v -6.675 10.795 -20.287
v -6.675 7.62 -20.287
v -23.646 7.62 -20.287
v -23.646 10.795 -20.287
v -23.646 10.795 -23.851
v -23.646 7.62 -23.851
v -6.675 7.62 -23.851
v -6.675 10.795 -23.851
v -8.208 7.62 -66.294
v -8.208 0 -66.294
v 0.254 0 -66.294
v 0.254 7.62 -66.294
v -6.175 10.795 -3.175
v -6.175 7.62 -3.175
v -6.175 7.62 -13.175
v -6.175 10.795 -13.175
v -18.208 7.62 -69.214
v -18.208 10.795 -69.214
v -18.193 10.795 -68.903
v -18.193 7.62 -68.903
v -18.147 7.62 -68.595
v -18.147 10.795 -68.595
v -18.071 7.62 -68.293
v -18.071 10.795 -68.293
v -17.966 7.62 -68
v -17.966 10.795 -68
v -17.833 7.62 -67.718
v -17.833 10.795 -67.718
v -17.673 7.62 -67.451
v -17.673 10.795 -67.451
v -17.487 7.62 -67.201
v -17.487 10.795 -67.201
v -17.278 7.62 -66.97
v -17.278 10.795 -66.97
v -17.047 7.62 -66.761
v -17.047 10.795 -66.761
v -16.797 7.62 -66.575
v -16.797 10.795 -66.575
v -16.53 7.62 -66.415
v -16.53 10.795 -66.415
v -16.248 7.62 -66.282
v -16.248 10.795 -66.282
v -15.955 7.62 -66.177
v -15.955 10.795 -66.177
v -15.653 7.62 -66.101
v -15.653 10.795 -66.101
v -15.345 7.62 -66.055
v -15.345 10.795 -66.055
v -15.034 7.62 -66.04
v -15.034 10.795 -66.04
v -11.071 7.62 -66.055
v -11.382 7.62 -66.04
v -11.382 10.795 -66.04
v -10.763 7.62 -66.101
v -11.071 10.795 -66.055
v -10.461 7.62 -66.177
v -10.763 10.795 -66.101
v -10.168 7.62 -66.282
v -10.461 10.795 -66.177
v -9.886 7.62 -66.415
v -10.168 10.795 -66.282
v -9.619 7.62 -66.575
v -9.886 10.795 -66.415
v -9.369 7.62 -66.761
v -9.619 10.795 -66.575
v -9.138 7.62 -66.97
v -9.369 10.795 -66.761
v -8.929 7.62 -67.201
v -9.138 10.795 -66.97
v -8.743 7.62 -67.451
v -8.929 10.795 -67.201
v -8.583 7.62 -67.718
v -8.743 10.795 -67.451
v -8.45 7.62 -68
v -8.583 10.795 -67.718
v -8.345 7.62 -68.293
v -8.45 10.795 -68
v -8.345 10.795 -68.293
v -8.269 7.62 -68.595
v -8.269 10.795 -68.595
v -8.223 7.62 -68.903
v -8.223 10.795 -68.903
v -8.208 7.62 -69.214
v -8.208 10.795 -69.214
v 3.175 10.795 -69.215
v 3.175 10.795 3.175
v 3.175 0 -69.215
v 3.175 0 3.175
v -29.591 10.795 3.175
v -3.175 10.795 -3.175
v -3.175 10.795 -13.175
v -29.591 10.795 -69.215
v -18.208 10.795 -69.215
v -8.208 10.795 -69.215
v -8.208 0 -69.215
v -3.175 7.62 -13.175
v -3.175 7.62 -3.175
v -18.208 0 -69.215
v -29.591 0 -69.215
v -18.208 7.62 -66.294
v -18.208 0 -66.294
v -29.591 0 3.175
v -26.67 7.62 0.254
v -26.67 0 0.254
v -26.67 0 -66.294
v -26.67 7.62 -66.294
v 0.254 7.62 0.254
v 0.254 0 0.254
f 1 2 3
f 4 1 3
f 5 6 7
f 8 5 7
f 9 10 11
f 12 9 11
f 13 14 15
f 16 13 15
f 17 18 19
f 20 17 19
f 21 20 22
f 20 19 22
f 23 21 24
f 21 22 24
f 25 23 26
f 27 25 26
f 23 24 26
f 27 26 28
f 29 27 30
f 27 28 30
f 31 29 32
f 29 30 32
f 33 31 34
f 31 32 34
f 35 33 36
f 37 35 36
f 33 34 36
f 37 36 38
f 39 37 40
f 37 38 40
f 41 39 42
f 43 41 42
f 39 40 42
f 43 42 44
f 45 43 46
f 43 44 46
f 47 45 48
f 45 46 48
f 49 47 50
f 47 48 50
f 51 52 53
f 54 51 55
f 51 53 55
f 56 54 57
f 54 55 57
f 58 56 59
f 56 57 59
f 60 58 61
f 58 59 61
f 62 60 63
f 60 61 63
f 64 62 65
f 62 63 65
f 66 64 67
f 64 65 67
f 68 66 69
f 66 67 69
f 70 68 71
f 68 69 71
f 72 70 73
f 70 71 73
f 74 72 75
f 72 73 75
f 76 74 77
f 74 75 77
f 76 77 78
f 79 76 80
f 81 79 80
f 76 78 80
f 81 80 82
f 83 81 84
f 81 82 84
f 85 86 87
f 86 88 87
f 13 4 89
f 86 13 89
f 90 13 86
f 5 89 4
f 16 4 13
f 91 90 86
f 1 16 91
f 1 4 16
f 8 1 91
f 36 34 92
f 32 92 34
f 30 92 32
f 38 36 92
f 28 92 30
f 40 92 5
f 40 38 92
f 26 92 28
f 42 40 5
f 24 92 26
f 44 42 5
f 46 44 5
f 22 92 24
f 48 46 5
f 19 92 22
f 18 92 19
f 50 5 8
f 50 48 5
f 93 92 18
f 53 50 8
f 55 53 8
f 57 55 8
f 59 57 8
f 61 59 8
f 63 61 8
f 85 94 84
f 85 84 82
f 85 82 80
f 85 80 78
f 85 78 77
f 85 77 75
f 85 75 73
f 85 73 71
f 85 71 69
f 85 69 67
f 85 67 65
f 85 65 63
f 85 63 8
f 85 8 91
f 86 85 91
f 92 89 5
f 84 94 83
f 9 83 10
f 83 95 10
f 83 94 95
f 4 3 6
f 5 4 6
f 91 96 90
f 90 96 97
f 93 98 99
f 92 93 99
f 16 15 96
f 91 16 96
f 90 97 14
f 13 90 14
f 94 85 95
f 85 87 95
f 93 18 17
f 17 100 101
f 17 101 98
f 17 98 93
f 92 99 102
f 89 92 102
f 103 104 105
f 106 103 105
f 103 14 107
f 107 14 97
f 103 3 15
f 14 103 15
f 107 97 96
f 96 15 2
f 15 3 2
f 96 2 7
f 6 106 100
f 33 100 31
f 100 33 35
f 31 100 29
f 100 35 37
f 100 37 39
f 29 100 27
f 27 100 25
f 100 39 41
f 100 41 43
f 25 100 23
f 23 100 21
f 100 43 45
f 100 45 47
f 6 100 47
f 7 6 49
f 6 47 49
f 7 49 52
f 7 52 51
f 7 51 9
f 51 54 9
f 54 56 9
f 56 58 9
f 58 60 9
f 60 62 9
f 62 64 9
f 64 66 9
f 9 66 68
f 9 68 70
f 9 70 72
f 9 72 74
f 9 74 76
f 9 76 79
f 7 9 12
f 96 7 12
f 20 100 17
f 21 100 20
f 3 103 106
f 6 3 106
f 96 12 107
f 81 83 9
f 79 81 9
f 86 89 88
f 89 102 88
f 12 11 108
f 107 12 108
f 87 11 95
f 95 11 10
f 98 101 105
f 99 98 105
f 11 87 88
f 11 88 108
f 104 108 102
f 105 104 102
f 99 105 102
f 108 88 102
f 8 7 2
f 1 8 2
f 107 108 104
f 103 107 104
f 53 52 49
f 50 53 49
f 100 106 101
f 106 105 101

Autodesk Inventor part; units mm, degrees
ref_plane "YZ Plane" through (0, 0, 0) normal (1, 0, 0) x (0, 1, 0)
ref_plane "XZ Plane" through (0, 0, 0) normal (0, 1, 0) x (-1, 0, 0)
ref_plane "XY Plane" through (0, 0, 0) normal (0, 0, 1) x (1, 0, 0)
sketch "Sketch1" plane through (0, 0, 0) normal (0, 1, 0) x (-1, 0, 0)
  line L0 (0, 0) -> (26.416, 0)
  line L1 (26.416, 0) -> (26.416, -66.04)
  line L2 (26.416, -66.04) -> (0, -66.04)
  line L3 (0, -66.04) -> (0, 0)
  line L4 (29.591, -69.215) -> (29.591, 3.175)
  line L5 (29.591, 3.175) -> (-3.175, 3.175)
  line L6 (-3.175, 3.175) -> (-3.175, -69.215)
  line L7 (-3.175, -69.215) -> (29.591, -69.215)
  line L8 (13.208, -69.215) -> (18.208, -69.215)
  line L9 (18.208, -69.215) -> (18.208, -66.04)
  line L10 (18.208, -66.04) -> (13.208, -66.04)
  line L11 (13.208, -66.04) -> (13.208, -69.215)
  line L12 (13.208, -66.04) -> (8.208, -66.04)
  line L13 (8.208, -66.04) -> (8.208, -69.215)
  line L14 (8.208, -69.215) -> (13.208, -69.215)
  line L15 (13.208, -69.215) -> (13.208, -66.04)
  point P0 (18.208, -69.215)
  point P1 (8.208, -66.04)
  dimension "d0" = 26.416
  dimension "d1" = 66.04
  dimension "d2" = 3.175
  dimension "d3" = 5
  dimension "d4" = 5
extrude "Extrusion1" add sketch "Sketch1" along normal blind 7.62 contours L3 L2 L13 L7 L6 L5 L4 L9 L1 L0
sketch "Sketch2" plane through (0, 7.62, 0) normal (0, 1, 0) x (1, 0, 0)
  line L0 (-26.416, 0) -> (-26.416, 66.04) projected
  line L1 (-26.416, 0) -> (0, 0)
  line L2 (0, 0) -> (0, 66.04)
  line L3 (0, 66.04) -> (-26.416, 66.04)
  line L4 (-26.416, 66.04) -> (-26.416, 0)
  line L5 (-3.175, 3.175) -> (-23.241, 3.175)
  line L6 (-23.241, 3.175) -> (-23.241, 62.865)
  line L7 (-23.241, 62.865) -> (-3.175, 62.865)
  line L8 (-3.175, 62.865) -> (-3.175, 3.175)
  line L9 (-3.175, 3.175) -> (-6.175, 3.175)
  line L10 (-6.175, 3.175) -> (-6.175, 13.175)
  line L11 (-6.175, 13.175) -> (-3.175, 13.175)
  line L12 (-3.175, 13.175) -> (-3.175, 3.175)
  line L13 (-26.416, 66.04) -> (-18.208, 66.04) projected
  line L14 (0, 66.04) -> (0, 0) projected
  line L15 (-6.175, 13.175) -> (-6.675, 13.175)
  line L16 (-6.675, 13.175) -> (-6.675, 20.287)
  line L17 (-6.675, 20.287) -> (-6.175, 20.287)
  line L18 (-6.175, 20.287) -> (-6.175, 13.175)
  line L19 (-6.675, 20.287) -> (-23.6463, 20.287)
  line L20 (-23.6463, 20.287) -> (-23.6463, 23.8513)
  line L21 (-23.6463, 23.8513) -> (-6.675, 23.8513)
  line L22 (-6.675, 23.8513) -> (-6.675, 20.287)
  point P0 (-26.416, 66.04)
  dimension "d8" = 3.175
  dimension "d9" = 3
  dimension "d10" = 10
  dimension "d11" = 0.5
  dimension "d12" = 7.112
extrude "Extrusion2" add sketch "Sketch2" along normal blind 3.175 contours L0 L3 L2 L1 | L5 L6 L19 L16 L15 L10 | L11 L18 L17 L22 L21 L6 L7 L8 | L15 L16 L17 L18
sketch "Sketch3" plane through (0, 7.62, 0) normal (0, 1, 0) x (1, 0, 0)
  line L0 (-26.416, 66.04) -> (-18.208, 66.04) projected
  line L1 (-18.208, 66.04) -> (-18.208, 69.215) projected
  line L2 (-18.208, 69.215) -> (-29.591, 69.215) projected
  line L3 (-29.591, 69.215) -> (-29.591, -3.175) projected
  line L4 (-29.591, -3.175) -> (3.175, -3.175) projected
  line L5 (3.175, -3.175) -> (3.175, 69.215) projected
  line L6 (3.175, 69.215) -> (-8.208, 69.215) projected
  line L7 (-8.208, 69.215) -> (-8.208, 66.04) projected
  line L8 (-8.208, 66.04) -> (0, 66.04) projected
  line L9 (0, 66.04) -> (0, 0) projected
  line L10 (0, 0) -> (-26.416, 0) projected
  line L11 (-26.416, 0) -> (-26.416, 66.04) projected
extrude "Extrusion3" add sketch "Sketch3" along normal blind 3.175
fillet "Fillet1" radius 3.175 2 edges at (-18.208, 9.2075, -66.04) (-8.208, 9.2075, -66.04)
sketch "Sketch4" plane through (0, 0, 0) normal (0, -1, 0) x (1, 0, 0)
  line L0 (0, 0) -> (-26.416, 0) projected
  line L1 (-26.416, -66.04) -> (-18.208, -66.04) projected
  line L2 (0, 0) -> (-26.416, 0)
  line L3 (-26.416, 0) -> (-26.416, -66.04)
  line L4 (-26.416, -66.04) -> (0, -66.04)
  line L5 (0, -66.04) -> (0, 0)
  line L6 (0.254, 0.254) -> (-26.67, 0.254)
  line L7 (-26.67, 0.254) -> (-26.67, -66.294)
  line L8 (-26.67, -66.294) -> (0.254, -66.294)
  line L9 (0.254, -66.294) -> (0.254, 0.254)
  dimension "d18" = 0.254
extrude "Extrusion4" cut sketch "Sketch4" against normal up to surface (7.62 mm away) contours L5 L4 L1 L3 L0 | L9 L8 L7 L6
properties part number "RadioMountCover" material "Rubber, Silicone"
